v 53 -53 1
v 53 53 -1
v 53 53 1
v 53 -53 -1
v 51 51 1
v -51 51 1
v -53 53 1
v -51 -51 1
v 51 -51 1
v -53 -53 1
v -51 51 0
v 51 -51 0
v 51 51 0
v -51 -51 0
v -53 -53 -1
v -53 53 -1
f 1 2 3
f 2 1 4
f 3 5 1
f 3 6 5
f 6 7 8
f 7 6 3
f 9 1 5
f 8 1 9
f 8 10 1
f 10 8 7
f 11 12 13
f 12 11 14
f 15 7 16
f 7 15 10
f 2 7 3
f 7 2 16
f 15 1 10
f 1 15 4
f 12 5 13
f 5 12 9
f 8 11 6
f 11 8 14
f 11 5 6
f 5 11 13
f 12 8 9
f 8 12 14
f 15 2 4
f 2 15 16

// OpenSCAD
size = 100;
ext = 6;
wall = 4;
height = 1;

module img() {
	translate([-size/2,-size/2]) 
		linear_extrude(height + 1, convexity= 4)
			resize([size,size]) 
				offset(r = 0.1) import("image.dxf");
}

module base(height = height) {
	union() {
		img();
		circle(r = 16, h = 1);
	}
}

module sqbase(height = height, ext = ext) {
	cube([size + ext, size + ext, 1], center = true);
}

module positive() {
	union() {
		translate([-2,-0.6,0])img();
		translate([0,0,-height / 2]) sqbase();
		translate([0,0,height / 2]) difference() {
			cube([size + ext, size + ext, height] , center = true);
			cube([size + ext - wall, size + ext- wall, height*1.001], center = true);
		}
	}
}

module negative() {
	difference() {
		cube([size + ext, size + ext, height * 2], center = true);
		translate([0, 0, -height * 0]) img();
	}
}

//img();
positive();
